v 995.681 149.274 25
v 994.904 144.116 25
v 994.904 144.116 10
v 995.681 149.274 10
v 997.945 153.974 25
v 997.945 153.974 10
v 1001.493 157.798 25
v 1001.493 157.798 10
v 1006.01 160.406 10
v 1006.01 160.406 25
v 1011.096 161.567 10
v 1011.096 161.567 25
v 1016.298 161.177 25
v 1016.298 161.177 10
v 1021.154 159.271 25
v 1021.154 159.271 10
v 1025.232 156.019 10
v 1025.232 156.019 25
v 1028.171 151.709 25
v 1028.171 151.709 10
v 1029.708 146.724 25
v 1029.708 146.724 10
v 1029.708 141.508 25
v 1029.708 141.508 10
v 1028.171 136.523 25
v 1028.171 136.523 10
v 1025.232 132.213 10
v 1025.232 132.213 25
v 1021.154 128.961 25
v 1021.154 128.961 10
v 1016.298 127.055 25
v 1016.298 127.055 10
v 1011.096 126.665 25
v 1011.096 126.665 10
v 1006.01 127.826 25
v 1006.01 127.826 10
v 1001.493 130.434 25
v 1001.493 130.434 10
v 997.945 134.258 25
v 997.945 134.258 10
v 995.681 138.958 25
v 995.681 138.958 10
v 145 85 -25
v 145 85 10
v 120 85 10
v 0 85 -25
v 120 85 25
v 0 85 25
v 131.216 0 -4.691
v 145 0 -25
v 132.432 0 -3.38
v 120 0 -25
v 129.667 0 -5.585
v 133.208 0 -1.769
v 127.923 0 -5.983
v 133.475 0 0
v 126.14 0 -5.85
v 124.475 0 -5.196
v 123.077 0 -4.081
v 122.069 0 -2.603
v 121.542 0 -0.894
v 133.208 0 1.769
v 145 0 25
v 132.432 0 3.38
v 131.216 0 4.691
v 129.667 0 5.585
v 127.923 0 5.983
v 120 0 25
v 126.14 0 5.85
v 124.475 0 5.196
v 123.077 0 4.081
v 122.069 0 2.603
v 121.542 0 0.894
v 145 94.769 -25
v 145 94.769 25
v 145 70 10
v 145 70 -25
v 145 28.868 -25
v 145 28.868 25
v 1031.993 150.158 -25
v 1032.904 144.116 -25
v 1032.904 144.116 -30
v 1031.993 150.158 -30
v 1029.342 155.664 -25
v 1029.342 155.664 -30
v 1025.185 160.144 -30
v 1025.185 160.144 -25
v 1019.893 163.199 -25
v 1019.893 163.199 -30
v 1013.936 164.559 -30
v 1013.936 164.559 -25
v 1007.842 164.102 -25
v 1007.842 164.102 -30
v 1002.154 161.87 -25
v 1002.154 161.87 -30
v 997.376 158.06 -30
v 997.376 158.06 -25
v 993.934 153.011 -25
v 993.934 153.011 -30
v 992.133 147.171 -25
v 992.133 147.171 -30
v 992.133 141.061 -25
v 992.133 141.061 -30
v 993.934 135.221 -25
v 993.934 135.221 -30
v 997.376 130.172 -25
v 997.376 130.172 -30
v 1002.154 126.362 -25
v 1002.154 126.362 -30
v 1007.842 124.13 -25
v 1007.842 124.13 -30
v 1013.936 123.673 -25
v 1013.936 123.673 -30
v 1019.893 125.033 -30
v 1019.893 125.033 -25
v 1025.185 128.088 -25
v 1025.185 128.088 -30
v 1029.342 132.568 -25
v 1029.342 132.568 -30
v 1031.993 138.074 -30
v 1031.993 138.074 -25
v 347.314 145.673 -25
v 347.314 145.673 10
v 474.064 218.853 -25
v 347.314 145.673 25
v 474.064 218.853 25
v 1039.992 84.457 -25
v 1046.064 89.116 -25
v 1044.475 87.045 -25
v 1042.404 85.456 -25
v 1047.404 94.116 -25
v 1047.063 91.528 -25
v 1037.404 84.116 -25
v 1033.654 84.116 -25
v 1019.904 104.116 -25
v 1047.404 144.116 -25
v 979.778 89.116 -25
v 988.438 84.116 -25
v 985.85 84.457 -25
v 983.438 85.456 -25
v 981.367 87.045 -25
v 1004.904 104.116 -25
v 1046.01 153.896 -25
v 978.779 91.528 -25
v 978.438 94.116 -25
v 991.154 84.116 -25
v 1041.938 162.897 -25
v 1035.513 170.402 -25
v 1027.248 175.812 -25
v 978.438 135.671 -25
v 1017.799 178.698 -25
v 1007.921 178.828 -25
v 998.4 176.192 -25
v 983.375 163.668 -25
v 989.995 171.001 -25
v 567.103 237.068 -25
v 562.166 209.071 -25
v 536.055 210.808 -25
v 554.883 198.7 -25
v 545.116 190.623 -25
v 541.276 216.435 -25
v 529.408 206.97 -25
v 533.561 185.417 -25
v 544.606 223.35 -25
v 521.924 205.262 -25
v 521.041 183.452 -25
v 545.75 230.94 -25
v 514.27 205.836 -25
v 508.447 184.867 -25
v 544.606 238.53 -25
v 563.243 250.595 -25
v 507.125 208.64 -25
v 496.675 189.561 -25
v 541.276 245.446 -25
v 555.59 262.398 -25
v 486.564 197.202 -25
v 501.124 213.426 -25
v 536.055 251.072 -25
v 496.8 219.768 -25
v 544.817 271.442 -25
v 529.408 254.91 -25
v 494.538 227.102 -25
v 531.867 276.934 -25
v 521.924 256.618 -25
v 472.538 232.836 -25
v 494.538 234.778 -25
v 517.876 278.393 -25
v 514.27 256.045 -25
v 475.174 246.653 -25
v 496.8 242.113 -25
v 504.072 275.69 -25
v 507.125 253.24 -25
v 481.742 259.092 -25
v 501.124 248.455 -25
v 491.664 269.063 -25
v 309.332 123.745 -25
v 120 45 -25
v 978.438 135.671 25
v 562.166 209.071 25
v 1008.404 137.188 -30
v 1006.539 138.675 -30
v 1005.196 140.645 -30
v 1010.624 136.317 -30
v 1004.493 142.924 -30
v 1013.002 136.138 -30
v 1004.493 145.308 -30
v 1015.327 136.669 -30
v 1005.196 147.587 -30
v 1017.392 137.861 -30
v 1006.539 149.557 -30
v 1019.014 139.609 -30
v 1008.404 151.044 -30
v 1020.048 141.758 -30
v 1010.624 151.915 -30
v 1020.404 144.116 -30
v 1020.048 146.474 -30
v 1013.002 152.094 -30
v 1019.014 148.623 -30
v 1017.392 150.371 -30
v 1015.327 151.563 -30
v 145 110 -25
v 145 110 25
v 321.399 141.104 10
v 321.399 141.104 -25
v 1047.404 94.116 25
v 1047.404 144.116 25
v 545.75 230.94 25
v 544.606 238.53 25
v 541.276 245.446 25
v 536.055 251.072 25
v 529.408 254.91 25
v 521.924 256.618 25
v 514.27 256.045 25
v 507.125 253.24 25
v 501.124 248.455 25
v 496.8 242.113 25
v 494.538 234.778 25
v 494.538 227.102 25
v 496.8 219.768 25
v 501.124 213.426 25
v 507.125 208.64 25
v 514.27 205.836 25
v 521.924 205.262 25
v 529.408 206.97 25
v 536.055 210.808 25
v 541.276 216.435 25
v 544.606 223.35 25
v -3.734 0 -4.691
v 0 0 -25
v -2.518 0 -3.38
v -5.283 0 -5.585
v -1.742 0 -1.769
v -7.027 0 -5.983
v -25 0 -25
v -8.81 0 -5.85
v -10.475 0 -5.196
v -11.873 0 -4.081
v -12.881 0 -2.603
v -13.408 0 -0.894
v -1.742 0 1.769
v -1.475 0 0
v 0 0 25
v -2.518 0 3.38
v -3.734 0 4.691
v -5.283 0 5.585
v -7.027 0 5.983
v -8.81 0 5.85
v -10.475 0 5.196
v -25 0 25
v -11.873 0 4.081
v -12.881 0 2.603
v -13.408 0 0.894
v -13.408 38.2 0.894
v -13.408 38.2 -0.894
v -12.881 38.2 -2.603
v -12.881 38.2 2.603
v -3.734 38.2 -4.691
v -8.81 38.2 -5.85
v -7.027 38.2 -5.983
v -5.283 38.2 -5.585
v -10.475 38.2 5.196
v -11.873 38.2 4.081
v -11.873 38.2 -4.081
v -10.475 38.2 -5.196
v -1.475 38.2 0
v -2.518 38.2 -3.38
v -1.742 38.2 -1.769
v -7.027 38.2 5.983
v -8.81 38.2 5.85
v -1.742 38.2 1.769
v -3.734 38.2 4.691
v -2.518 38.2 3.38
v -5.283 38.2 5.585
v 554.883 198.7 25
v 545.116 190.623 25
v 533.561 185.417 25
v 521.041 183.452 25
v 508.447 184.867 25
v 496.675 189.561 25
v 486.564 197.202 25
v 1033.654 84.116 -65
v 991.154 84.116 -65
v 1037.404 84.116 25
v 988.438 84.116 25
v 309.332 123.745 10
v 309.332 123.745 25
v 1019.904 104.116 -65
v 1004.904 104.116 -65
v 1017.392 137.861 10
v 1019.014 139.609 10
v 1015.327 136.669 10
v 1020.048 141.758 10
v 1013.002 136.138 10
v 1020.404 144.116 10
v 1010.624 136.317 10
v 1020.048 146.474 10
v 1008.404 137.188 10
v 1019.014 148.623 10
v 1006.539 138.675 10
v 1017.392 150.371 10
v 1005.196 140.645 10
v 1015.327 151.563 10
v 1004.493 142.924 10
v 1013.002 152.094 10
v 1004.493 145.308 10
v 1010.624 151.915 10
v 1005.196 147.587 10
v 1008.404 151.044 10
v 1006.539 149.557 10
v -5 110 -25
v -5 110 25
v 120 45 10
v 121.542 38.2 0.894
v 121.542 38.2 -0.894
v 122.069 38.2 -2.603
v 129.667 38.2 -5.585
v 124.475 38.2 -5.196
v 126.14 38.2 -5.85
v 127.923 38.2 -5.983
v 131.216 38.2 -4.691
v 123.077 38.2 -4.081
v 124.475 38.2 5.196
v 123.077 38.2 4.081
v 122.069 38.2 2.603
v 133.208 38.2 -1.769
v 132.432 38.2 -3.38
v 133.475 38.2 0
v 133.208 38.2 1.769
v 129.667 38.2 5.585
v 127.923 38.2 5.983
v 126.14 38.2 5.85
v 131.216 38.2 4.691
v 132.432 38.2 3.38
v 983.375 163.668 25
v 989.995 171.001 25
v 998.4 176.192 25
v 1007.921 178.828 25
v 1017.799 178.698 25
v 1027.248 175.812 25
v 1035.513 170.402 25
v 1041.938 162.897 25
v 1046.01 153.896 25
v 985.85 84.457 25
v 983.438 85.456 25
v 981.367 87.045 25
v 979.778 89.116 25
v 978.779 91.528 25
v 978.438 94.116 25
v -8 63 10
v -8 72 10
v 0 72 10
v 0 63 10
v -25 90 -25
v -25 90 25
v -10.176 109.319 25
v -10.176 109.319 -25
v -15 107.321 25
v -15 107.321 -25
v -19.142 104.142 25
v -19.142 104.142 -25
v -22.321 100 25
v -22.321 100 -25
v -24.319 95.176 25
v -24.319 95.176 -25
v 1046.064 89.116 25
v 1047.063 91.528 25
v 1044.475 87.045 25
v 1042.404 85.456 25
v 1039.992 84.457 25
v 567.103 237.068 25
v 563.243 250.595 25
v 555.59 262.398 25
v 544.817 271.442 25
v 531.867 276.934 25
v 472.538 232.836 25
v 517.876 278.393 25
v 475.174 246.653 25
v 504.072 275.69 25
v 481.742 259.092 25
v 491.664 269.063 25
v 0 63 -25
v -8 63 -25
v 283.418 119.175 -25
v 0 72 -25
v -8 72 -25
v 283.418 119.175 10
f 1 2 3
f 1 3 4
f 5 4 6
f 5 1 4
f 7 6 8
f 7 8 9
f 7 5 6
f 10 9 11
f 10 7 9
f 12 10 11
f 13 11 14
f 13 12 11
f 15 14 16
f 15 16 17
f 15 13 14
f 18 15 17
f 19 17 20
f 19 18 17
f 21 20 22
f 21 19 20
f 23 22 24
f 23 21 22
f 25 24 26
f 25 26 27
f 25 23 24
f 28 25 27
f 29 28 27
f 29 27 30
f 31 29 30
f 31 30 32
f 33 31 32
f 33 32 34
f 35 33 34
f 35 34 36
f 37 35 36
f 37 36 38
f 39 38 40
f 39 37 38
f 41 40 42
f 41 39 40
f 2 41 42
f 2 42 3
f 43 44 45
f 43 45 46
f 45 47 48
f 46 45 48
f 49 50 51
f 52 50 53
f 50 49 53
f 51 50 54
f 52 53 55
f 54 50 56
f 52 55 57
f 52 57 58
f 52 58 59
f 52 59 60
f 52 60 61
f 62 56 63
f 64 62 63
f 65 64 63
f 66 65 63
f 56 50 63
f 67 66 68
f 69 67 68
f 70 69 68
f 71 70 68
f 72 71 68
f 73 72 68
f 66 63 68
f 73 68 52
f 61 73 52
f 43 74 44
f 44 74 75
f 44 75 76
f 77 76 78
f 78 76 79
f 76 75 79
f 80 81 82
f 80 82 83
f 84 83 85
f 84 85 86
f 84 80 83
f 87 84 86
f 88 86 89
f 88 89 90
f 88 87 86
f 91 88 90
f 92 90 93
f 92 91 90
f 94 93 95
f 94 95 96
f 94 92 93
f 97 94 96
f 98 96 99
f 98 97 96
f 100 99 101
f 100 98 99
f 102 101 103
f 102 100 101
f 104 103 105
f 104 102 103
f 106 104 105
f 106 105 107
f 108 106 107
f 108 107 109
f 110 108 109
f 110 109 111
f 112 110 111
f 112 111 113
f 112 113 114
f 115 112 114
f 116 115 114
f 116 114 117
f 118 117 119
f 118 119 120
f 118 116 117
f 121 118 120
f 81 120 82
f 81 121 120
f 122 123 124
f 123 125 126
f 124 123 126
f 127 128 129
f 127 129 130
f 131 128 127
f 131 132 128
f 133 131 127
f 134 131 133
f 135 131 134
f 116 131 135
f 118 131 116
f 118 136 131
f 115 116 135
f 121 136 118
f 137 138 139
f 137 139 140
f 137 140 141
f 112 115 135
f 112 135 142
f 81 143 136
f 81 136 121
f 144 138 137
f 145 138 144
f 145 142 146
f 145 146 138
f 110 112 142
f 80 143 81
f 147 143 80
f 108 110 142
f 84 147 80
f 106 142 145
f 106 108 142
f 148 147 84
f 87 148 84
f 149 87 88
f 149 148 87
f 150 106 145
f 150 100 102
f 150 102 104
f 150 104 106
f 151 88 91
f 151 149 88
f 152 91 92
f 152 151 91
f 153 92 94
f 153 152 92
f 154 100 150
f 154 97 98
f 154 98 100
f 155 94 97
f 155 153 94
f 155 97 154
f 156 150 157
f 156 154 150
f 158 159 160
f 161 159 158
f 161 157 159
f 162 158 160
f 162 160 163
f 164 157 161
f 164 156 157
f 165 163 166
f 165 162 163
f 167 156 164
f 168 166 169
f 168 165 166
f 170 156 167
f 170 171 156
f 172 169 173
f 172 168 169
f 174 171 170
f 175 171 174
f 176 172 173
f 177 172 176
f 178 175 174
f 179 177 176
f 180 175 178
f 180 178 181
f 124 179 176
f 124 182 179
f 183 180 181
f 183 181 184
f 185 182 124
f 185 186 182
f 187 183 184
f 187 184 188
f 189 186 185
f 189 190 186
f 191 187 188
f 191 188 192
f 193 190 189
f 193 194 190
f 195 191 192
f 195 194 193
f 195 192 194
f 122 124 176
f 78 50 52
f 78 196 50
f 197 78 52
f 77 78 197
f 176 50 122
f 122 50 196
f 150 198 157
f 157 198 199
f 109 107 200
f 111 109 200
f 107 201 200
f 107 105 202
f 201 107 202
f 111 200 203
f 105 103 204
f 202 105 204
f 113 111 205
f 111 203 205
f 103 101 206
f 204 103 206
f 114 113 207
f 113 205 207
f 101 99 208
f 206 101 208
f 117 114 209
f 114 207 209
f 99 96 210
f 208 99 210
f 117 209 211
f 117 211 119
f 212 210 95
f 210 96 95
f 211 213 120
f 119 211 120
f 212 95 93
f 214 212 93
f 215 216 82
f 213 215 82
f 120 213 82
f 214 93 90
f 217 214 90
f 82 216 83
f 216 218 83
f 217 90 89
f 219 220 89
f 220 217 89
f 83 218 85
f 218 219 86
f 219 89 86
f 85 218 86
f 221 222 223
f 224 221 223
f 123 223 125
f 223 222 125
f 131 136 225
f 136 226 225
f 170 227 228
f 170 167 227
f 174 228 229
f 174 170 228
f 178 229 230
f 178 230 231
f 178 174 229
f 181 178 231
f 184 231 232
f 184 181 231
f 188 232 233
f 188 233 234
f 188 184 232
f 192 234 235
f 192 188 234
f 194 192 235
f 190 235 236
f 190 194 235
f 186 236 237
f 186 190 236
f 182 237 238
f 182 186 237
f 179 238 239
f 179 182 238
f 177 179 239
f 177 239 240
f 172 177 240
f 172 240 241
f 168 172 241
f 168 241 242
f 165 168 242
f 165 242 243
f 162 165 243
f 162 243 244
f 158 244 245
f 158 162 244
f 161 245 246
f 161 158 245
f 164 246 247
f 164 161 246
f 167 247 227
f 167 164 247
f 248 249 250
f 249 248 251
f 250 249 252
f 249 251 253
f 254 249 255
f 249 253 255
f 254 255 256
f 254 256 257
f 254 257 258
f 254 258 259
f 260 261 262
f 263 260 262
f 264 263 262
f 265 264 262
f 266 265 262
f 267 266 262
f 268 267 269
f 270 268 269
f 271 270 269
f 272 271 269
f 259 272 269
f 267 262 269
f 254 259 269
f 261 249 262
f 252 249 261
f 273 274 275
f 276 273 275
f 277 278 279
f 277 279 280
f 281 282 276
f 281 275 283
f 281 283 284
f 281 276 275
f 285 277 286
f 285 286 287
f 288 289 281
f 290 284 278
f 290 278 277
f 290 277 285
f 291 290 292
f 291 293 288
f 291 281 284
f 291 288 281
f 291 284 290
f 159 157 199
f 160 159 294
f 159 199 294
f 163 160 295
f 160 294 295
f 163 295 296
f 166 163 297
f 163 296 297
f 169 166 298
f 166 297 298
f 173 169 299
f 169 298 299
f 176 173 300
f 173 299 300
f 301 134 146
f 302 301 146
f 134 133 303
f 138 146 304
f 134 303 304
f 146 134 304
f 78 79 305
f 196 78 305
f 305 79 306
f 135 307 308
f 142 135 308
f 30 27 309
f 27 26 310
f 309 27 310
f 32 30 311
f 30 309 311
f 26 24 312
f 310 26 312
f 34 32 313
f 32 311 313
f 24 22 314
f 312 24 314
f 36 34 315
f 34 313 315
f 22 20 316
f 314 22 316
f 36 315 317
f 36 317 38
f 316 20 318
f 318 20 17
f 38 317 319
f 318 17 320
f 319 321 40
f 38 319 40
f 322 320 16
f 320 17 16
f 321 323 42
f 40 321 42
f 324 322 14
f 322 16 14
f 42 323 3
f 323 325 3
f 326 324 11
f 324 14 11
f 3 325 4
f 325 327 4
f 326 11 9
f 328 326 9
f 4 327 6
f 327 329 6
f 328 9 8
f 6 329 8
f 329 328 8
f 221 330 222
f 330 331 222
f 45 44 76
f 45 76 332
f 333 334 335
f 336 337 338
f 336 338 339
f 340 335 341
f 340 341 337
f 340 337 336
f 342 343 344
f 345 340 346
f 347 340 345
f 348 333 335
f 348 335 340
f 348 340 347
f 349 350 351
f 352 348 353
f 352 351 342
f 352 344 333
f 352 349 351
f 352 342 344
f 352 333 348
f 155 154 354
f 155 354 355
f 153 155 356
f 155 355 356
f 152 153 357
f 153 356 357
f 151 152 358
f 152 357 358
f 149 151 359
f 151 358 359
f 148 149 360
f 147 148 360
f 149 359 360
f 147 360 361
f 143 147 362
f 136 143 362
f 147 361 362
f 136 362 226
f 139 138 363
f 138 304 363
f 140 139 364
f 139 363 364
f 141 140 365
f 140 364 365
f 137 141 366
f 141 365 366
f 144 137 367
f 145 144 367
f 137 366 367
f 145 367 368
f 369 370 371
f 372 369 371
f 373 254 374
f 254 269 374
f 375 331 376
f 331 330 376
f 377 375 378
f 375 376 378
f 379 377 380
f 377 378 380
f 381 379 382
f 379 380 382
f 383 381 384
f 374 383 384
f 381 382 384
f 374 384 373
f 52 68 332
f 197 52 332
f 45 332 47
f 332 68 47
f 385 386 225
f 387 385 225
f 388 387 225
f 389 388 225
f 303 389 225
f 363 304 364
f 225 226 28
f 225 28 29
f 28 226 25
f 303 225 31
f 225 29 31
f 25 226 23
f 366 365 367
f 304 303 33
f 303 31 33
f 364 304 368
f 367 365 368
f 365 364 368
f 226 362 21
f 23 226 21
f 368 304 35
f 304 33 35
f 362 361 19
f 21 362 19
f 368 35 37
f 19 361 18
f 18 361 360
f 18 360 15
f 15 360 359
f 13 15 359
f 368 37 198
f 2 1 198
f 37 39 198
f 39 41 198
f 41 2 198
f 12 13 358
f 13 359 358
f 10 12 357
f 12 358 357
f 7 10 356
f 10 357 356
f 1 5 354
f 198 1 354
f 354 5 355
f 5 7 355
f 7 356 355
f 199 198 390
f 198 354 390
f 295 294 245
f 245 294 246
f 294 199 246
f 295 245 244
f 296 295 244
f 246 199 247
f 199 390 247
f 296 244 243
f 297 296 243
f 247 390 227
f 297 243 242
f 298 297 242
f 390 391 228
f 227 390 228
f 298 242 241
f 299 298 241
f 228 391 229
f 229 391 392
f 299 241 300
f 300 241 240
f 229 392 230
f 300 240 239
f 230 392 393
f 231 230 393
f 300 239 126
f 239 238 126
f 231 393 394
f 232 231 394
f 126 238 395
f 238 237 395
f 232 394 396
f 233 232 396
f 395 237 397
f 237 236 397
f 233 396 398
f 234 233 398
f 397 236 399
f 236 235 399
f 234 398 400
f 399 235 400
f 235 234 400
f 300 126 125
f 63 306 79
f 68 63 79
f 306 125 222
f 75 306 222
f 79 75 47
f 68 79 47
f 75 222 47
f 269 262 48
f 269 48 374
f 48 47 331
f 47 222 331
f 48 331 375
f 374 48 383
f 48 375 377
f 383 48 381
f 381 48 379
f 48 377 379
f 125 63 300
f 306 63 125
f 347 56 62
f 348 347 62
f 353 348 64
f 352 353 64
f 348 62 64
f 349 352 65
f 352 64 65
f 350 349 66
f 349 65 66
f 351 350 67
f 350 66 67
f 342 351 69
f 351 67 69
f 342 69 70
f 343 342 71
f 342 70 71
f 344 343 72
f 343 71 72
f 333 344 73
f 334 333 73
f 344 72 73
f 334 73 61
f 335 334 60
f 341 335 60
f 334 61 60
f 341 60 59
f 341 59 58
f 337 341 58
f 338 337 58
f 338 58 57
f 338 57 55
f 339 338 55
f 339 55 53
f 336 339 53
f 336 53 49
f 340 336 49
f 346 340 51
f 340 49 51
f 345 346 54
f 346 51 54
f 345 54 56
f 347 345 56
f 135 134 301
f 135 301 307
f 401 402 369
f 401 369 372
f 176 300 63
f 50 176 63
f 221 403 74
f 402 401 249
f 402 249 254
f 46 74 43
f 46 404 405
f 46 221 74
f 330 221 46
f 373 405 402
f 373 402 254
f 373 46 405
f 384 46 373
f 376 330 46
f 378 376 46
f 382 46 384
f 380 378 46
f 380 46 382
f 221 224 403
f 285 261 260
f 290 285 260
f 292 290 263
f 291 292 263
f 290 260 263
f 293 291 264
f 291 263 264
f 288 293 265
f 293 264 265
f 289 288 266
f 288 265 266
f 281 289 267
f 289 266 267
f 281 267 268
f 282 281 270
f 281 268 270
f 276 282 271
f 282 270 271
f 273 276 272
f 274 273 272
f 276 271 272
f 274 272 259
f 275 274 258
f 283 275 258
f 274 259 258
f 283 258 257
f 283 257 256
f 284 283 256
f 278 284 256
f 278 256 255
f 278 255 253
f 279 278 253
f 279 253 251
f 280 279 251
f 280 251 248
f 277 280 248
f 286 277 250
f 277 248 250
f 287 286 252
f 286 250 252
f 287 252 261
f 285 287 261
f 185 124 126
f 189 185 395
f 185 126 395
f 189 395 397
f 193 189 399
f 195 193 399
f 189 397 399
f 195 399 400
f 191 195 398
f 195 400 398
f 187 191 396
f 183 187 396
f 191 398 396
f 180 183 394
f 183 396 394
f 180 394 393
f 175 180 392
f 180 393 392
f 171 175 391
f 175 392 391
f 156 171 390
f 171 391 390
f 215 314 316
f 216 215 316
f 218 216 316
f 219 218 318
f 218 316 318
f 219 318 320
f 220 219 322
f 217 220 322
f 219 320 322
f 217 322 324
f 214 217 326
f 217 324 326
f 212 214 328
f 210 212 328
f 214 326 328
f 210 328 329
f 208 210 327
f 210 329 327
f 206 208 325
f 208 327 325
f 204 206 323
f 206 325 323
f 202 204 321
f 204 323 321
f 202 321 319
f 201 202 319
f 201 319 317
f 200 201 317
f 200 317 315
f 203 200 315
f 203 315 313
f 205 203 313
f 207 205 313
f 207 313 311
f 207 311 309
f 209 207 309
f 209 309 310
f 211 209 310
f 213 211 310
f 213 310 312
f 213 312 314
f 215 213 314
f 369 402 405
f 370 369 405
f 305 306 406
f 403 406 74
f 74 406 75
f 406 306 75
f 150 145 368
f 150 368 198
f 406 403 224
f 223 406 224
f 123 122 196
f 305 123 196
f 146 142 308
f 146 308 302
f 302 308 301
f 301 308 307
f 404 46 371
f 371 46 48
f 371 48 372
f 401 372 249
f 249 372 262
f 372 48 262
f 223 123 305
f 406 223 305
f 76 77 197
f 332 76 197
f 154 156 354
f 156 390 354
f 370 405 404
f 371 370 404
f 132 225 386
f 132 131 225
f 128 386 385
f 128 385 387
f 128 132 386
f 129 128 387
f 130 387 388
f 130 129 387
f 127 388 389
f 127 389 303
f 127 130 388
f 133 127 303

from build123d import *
from OCP.BRepFilletAPI import BRepFilletAPI_MakeFillet

# Parameters (mm, degrees)
SKETCH1_R           = 25.75
BOSS_EXTRUDE1_DEPTH = 25
SKETCH2_R           = 20.5
SKETCH2_R_2         = 8
BOSS_EXTRUDE2_DEPTH = 5
BOSS_EXTRUDE3_DEPTH = 50
SKETCH5_R           = 8
CUT_EXTRUDE1_DEPTH  = 1086.176840005
SKETCH6_R           = 17.5
CUT_EXTRUDE2_DEPTH  = 15
SKETCH7_W           = 8
SKETCH7_H           = 9
CUT_EXTRUDE3_DEPTH  = 35
BOSS_EXTRUDE4_DEPTH = 40
SKETCH9_R           = 6
CUT_EXTRUDE4_DEPTH  = 38.2
FILLET1_R1          = 20
FILLET1_R2          = 10


with BuildPart() as part:
    # Sketch1 → Boss-Extrude1 (new, symmetric)
    with BuildSketch(Plane.XY):
        with BuildLine():
            Line((0, 0), (-25, 0))
            Line((-25, 0), (-25, 110))
            Line((-25, 110), (145, 110))
            Line((145, 110), (145, 28.867513459))
            Line((145, 28.867513459), (474.063730334, 218.852546748))
            ThreePointArc((474.063730334, 218.852546748), (510.873444118, 277.555083571), (567.103024177, 237.06833037))
            Line((567.103024177, 237.06833037), (983.374527569, 163.668433022))
            ThreePointArc((983.374527569, 163.668433022), (1022.625735123, 177.590092488), (1047.403876506, 144.116018842))
            Line((1047.403876506, 144.116018842), (1047.403876506, 84.116018842))
            Line((1047.403876506, 84.116018842), (978.437892023, 84.116018842))
            Line((978.437892023, 84.116018842), (978.437892023, 135.671381603))
            Line((978.437892023, 135.671381603), (562.166388631, 209.071278951))
            ThreePointArc((562.166388631, 209.071278951), (527.367103522, 184.014892858), (486.563730334, 197.201911654))
            Line((486.563730334, 197.201911654), (145, 0))
            Line((145, 0), (120, 0))
            Line((120, 0), (120, 85))
            Line((120, 85), (0, 85))
            Line((0, 85), (0, 0))
        make_face()
        with Locations((520, 230.940107676)):
            Circle(SKETCH1_R, mode=Mode.SUBTRACT)
    extrude(amount=BOSS_EXTRUDE1_DEPTH, both=True)

    # Sketch2 → Boss-Extrude2 (add)
    with BuildSketch(Plane.XY.offset(-25)):
        with Locations((1012.403876506, 144.116018842)):
            Circle(SKETCH2_R)
        with Locations((1012.403876506, 144.116018842)):
            Circle(SKETCH2_R_2, mode=Mode.SUBTRACT)
    extrude(amount=-BOSS_EXTRUDE2_DEPTH)

    # Sketch4 → Boss-Extrude3 (add)
    with BuildSketch(Plane.XY.offset(25)):
        Polygon((145, 110), (347.313653274, 145.673355638), (309.33231998, 123.744822637), (145, 94.768600822), align=None)
    extrude(amount=-BOSS_EXTRUDE3_DEPTH)

    # Sketch5 → Cut-Extrude1 (cut, through all)
    with BuildSketch(Plane.XY.offset(25)):
        with Locations((1012.403876506, 144.116018842)):
            Circle(SKETCH5_R)
    extrude(amount=-CUT_EXTRUDE1_DEPTH, mode=Mode.SUBTRACT)

    # Sketch6 → Cut-Extrude2 (cut)
    with BuildSketch(Plane(origin=(0, 0, 25), x_dir=(-1, 0, 0), z_dir=(0, 0, -1))):
        with Locations((-1012.403876506, 144.116018842)):
            Circle(SKETCH6_R)
    extrude(amount=CUT_EXTRUDE2_DEPTH, mode=Mode.SUBTRACT)

    # Sketch7 → Cut-Extrude3 (cut)
    with BuildSketch(Plane.XY.offset(-25)):
        Polygon((120, 85), (145, 85), (145, 70), (120, 45), align=None)
        Polygon((347.313653274, 145.673355638), (309.33231998, 123.744822637), (283.417852806, 119.175402883), (321.3991861, 141.103935884), align=None)
        with Locations((-4, 67.5)):
            Rectangle(SKETCH7_W, SKETCH7_H)
    extrude(amount=CUT_EXTRUDE3_DEPTH, mode=Mode.SUBTRACT)

    # Sketch8 → Boss-Extrude4 (add)
    with BuildSketch(Plane.XY.offset(-25)):
        Polygon((991.153876506, 84.116018842), (1033.653876506, 84.116018842), (1019.903876506, 104.116018842), (1004.903876506, 104.116018842), align=None)
    extrude(amount=-BOSS_EXTRUDE4_DEPTH)

    # Sketch9 → Cut-Extrude4 (cut)
    with BuildSketch(Plane.XZ):
        with Locations((-7.475, 0)):
            Circle(SKETCH9_R)
        with Locations((127.475, 0)):
            Circle(SKETCH9_R)
    extrude(amount=-CUT_EXTRUDE4_DEPTH, mode=Mode.SUBTRACT)

    # Fillet1: one fillet with a radius per group of edges: ONE call of the kernel's fillet builder (fillet() takes one radius for all edges)
    fillet1_edges_1 = [part.edges().sort_by_distance(p)[0] for p in [
        (-25, 110, 0),
    ]]
    fillet1_edges_2 = [part.edges().sort_by_distance(p)[0] for p in [
        (1047.403876506, 84.116018842, 0),
        (978.437892023, 84.116018842, 0),
    ]]
    fillet1 = BRepFilletAPI_MakeFillet(part.part.solid().wrapped)
    for e in fillet1_edges_1:
        fillet1.Add(FILLET1_R1, e.wrapped)
    for e in fillet1_edges_2:
        fillet1.Add(FILLET1_R2, e.wrapped)
    add(Compound.cast(fillet1.Shape()), mode=Mode.REPLACE)


solid = part.part
